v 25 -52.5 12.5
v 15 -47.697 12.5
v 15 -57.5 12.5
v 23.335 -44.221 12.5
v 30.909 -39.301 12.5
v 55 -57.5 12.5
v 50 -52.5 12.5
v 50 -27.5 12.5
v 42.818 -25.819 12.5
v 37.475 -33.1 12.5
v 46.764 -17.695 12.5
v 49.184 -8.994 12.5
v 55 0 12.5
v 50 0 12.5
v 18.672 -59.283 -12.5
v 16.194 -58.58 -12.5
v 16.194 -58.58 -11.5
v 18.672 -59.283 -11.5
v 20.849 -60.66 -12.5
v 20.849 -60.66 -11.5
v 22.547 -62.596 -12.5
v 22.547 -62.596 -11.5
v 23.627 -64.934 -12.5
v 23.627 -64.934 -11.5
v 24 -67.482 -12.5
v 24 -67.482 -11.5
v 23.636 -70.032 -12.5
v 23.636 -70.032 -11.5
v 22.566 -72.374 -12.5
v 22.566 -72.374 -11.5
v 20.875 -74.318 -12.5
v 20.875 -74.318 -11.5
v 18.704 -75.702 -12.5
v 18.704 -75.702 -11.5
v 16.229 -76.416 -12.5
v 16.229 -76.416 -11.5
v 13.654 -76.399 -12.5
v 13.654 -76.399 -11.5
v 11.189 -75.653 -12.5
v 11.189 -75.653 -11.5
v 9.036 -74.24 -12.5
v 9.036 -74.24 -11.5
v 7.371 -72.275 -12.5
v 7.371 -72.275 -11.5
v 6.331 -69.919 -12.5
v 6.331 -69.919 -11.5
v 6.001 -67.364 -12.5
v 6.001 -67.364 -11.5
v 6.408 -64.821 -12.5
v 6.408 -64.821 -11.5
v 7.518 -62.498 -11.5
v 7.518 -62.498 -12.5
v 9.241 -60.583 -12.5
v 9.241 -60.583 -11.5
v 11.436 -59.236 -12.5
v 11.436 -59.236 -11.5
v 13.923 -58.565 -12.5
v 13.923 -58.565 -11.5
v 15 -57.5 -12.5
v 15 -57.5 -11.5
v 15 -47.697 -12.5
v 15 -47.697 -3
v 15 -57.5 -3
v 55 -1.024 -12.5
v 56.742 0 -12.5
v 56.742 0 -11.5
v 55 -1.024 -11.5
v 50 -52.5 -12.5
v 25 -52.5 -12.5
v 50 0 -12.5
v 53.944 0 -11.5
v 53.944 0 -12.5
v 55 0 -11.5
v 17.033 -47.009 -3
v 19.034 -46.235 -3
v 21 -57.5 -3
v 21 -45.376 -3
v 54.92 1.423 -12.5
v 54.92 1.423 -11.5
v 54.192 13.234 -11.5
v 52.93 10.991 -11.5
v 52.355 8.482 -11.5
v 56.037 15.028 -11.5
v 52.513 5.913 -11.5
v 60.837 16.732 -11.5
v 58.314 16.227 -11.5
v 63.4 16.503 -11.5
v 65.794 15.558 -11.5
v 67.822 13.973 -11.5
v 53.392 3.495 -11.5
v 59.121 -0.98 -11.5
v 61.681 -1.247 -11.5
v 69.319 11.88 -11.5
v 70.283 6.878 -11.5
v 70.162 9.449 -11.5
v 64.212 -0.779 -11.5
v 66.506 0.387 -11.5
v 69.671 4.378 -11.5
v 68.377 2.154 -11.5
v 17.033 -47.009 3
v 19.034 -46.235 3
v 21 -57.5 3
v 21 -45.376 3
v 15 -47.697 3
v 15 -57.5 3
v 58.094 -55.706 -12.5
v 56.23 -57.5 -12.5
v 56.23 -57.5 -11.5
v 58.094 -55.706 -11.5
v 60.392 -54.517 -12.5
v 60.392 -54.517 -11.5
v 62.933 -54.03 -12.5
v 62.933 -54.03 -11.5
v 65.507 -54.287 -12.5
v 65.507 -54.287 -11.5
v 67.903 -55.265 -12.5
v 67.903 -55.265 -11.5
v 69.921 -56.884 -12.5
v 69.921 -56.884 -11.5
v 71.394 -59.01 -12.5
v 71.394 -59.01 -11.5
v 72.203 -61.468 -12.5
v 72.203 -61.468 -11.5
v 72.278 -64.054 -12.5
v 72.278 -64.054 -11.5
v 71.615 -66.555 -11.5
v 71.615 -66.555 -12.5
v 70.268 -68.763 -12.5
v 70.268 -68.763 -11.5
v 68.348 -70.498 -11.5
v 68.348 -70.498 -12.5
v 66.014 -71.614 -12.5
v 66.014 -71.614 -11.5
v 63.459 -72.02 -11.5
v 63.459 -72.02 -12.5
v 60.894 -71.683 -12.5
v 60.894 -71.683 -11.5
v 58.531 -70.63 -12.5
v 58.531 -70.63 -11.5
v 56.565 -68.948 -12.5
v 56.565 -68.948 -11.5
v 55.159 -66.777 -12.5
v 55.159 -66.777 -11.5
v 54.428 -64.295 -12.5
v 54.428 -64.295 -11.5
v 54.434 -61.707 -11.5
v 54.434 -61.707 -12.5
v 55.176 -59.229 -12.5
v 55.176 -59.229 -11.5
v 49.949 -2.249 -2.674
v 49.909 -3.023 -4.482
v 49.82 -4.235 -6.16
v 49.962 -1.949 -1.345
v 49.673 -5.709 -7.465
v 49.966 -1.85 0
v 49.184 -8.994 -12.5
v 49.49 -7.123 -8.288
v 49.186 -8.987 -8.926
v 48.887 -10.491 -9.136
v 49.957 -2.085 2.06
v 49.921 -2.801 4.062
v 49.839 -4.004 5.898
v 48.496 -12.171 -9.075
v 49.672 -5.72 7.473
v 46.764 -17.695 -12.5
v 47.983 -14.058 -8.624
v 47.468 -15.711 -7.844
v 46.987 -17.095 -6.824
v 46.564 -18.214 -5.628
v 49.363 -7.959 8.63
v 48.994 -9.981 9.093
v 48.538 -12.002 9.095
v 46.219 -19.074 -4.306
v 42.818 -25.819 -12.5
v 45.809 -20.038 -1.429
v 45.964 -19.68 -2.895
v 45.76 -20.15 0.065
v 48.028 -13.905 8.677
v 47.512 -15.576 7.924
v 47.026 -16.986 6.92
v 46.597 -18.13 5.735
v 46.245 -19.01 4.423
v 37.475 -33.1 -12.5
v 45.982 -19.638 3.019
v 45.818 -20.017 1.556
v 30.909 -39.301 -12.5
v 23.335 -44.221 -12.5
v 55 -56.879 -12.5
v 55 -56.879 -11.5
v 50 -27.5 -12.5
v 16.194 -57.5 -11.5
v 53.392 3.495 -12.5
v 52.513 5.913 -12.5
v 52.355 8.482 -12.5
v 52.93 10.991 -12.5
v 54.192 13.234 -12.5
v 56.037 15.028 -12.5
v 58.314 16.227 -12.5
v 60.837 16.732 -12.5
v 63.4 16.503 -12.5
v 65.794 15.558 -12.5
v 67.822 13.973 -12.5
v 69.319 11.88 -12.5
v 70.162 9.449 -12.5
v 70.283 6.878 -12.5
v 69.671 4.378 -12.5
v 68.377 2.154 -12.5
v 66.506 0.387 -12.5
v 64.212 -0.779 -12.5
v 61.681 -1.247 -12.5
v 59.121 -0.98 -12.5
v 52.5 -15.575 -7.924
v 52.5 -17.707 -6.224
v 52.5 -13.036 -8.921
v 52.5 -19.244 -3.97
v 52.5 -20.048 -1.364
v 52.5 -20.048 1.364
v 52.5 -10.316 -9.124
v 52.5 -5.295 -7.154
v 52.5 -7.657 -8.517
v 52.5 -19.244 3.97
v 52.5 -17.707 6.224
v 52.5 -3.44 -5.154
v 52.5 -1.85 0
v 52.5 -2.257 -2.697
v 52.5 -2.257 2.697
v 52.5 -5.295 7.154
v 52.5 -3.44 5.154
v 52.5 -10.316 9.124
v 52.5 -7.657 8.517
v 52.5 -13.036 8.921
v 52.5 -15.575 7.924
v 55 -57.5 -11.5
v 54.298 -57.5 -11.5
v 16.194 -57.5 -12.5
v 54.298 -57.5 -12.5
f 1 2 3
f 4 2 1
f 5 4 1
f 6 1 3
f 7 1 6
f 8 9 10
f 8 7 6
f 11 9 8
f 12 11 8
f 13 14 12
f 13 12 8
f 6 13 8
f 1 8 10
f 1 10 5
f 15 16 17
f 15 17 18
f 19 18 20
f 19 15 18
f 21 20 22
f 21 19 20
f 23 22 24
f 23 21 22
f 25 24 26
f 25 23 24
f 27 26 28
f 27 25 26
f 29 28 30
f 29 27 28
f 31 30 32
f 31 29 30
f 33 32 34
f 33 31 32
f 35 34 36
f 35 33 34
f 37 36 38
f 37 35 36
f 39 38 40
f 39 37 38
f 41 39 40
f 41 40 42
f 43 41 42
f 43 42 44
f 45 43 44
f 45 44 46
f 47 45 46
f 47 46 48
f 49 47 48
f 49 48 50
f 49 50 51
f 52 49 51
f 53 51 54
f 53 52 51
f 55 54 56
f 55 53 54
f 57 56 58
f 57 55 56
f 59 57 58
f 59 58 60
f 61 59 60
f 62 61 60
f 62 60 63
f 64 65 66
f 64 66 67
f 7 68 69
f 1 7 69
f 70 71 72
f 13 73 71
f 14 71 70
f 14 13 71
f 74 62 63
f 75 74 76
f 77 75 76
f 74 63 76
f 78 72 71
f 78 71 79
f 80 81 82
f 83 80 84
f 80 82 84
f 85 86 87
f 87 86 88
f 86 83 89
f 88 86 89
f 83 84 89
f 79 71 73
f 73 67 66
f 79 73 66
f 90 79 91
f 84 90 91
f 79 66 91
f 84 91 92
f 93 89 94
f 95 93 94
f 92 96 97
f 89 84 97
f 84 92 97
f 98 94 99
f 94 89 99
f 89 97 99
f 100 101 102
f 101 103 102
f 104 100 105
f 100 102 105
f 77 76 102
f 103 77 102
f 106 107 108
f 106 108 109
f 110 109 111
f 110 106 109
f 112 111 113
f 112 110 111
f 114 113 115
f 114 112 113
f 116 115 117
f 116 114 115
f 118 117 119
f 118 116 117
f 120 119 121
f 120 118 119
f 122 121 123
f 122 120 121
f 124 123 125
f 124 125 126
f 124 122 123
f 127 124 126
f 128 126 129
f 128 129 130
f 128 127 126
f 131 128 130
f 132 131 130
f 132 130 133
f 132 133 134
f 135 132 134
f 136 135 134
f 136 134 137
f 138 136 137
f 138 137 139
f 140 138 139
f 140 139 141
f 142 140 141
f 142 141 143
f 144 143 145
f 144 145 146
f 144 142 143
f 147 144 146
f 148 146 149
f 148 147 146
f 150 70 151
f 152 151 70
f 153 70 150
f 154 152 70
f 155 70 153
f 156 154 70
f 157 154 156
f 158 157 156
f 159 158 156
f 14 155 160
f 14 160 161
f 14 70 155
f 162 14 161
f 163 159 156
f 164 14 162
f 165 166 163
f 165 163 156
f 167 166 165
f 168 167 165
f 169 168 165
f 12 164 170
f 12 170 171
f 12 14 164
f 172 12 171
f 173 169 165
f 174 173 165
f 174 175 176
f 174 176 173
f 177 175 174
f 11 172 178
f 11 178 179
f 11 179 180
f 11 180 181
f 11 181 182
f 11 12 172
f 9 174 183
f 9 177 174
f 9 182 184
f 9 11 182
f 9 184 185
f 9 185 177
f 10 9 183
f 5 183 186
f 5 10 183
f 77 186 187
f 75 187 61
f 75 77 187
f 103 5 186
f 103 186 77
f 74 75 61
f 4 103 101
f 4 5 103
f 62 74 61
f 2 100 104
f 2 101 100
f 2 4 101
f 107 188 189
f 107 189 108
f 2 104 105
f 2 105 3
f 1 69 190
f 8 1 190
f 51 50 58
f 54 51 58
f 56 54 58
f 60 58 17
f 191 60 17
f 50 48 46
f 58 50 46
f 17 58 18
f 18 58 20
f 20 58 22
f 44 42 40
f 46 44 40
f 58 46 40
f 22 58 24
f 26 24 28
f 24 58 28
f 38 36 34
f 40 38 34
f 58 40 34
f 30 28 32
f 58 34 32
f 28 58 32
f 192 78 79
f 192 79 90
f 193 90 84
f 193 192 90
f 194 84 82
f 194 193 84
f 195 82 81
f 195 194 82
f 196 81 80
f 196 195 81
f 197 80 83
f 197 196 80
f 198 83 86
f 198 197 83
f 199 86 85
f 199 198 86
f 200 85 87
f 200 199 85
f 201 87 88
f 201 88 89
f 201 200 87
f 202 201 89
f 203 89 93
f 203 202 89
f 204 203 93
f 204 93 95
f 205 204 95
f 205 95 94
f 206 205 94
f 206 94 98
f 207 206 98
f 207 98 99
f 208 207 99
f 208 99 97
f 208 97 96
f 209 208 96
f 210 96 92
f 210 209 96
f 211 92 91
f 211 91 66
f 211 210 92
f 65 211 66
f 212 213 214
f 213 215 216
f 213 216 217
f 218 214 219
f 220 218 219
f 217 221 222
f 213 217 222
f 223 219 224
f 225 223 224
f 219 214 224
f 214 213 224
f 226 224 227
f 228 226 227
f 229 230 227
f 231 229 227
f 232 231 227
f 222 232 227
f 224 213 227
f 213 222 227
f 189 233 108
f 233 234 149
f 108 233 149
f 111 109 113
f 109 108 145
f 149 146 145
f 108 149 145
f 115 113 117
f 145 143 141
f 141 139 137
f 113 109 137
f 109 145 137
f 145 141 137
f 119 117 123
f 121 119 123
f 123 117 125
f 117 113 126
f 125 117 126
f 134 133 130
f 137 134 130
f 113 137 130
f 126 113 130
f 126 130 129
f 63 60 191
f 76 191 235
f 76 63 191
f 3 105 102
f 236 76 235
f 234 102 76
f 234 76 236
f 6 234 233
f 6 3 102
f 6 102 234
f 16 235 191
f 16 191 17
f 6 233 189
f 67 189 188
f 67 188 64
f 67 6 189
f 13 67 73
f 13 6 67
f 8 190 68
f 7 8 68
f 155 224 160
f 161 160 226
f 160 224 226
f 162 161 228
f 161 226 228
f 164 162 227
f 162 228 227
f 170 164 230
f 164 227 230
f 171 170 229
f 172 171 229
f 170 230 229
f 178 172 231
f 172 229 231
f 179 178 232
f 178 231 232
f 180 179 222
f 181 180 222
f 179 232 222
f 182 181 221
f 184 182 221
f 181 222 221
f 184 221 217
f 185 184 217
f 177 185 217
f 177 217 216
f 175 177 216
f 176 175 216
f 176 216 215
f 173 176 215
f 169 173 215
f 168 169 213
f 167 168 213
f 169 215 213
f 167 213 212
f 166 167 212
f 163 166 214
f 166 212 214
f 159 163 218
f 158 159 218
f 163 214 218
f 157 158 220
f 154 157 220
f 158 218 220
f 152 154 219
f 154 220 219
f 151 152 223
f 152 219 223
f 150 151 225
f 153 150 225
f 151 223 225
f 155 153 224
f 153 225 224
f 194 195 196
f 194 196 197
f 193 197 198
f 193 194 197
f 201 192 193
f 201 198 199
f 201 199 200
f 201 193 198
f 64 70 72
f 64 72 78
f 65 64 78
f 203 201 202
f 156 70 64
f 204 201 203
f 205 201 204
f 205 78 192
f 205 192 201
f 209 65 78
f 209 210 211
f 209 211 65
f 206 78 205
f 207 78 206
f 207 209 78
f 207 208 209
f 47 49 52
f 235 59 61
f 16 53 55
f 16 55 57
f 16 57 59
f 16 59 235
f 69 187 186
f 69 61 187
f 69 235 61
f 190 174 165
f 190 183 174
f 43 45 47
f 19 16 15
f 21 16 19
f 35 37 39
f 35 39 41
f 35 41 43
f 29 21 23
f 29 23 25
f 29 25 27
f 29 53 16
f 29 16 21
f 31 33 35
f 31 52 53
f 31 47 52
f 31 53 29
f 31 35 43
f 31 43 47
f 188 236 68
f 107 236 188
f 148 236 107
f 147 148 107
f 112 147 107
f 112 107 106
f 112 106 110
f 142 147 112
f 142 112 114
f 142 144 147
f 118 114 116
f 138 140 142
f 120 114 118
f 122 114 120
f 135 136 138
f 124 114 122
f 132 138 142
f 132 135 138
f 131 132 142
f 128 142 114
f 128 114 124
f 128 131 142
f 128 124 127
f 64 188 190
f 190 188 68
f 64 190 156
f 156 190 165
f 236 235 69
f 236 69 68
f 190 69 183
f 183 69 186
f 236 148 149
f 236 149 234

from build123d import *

# Parameters (mm, degrees)
F1_DEPTH  = 12.5
F3_DEPTH  = 25
F4_R      = 9.05
F5_DEPTH  = 55
F6_R      = 9.15
F7_DEPTH  = 52.5
F9_DEPTH  = 57.501
F11_DEPTH = 25
F13_DEPTH = 1


with BuildPart() as f1:
    # F0 (on Top) → F1 (new body, symmetric)
    with BuildSketch(Plane.XY):
        with BuildLine():
            ThreePointArc((50, 0), (0, -50), (-50, 0))
            Line((-50, 0), (-55, 0))
            ThreePointArc((-55, 0), (0, -55), (55, 0))
            Line((55, 0), (50, 0))
        make_face()
    extrude(amount=F1_DEPTH, both=True)

    # F2 (on face) → F3 (join)
    with BuildSketch(Plane.XY.offset(12.5)):
        with BuildLine():
            ThreePointArc((55, 0), (0, -55), (-55, 0))
            Line((-55, 0), (-55, -57.5))
            Line((-55, -57.5), (0, -57.5))
            Line((0, -57.5), (55, -57.5))
            Line((55, -57.5), (55, 0))
        make_face()
    extrude(amount=-F3_DEPTH)

    # F4 (on Front) → F5 (cut)
    with BuildSketch(Plane.XZ):
        Circle(F4_R)
    extrude(amount=F5_DEPTH, mode=Mode.SUBTRACT)

    # F6 (on Right) → F7 (cut, symmetric)
    with BuildSketch(Plane.YZ):
        with Locations((-11, 0)):
            Circle(F6_R)
    extrude(amount=F7_DEPTH, both=True, mode=Mode.SUBTRACT)

    # F8 (on face) → F9 (cut, through all)
    with BuildSketch(Plane.XZ.offset(57.5)):
        Polygon((15, 12.5), (-15, 12.5), (-15, 48.375133), (-89.987703, 48.375133), (-91.230497, -54.7974), (-15, -56.857262), (-15, -12.5), (15, -12.5), (15, -3), (21, -3), (21, 0), (21, 3), (15, 3), align=None)
    extrude(amount=-F9_DEPTH, mode=Mode.SUBTRACT)

    # F10 (on face) → F11 (cut)
    with BuildSketch(Plane(origin=(0, 0, -12.5), x_dir=(1, 0, 0), z_dir=(0, 0, -1))):
        Polygon((50, 27.5), (50, 52.5), (25, 52.5), align=None)
    extrude(amount=-F11_DEPTH, mode=Mode.SUBTRACT)

    # F12 (on face) → F13 (join)
    with BuildSketch(Plane(origin=(0, 0, -12.5), x_dir=(1, 0, 0), z_dir=(0, 0, -1))):
        with BuildLine():
            Line((16.194436, 57.5), (16.194436, 58.579612))
            ThreePointArc((16.194436, 58.579612), (14.941014, 76.499807), (13.922594, 58.564722))
            Line((13.922594, 58.564722), (15, 57.5))
            Line((15, 57.5), (16.194436, 57.5))
        make_face()
        with BuildLine():
            Line((55, 56.879111), (56.230159, 57.5))
            ThreePointArc((56.230159, 57.5), (71.021188, 67.707692), (55.175651, 59.228867))
            Line((55.175651, 59.228867), (54.298293, 57.5))
            Line((54.298293, 57.5), (55, 57.5))
            Line((55, 57.5), (55, 56.879111))
        make_face()
        with BuildLine():
            Line((53.94445, 0), (54.919557, -1.423379))
            ThreePointArc((54.919557, -1.423379), (66.865014, -14.838437), (56.741846, 0))
            Line((56.741846, 0), (55, 1.024423))
            Line((55, 1.024423), (55, 0))
            Line((55, 0), (53.94445, 0))
        make_face()
    extrude(amount=-F13_DEPTH)


solid = f1.part
